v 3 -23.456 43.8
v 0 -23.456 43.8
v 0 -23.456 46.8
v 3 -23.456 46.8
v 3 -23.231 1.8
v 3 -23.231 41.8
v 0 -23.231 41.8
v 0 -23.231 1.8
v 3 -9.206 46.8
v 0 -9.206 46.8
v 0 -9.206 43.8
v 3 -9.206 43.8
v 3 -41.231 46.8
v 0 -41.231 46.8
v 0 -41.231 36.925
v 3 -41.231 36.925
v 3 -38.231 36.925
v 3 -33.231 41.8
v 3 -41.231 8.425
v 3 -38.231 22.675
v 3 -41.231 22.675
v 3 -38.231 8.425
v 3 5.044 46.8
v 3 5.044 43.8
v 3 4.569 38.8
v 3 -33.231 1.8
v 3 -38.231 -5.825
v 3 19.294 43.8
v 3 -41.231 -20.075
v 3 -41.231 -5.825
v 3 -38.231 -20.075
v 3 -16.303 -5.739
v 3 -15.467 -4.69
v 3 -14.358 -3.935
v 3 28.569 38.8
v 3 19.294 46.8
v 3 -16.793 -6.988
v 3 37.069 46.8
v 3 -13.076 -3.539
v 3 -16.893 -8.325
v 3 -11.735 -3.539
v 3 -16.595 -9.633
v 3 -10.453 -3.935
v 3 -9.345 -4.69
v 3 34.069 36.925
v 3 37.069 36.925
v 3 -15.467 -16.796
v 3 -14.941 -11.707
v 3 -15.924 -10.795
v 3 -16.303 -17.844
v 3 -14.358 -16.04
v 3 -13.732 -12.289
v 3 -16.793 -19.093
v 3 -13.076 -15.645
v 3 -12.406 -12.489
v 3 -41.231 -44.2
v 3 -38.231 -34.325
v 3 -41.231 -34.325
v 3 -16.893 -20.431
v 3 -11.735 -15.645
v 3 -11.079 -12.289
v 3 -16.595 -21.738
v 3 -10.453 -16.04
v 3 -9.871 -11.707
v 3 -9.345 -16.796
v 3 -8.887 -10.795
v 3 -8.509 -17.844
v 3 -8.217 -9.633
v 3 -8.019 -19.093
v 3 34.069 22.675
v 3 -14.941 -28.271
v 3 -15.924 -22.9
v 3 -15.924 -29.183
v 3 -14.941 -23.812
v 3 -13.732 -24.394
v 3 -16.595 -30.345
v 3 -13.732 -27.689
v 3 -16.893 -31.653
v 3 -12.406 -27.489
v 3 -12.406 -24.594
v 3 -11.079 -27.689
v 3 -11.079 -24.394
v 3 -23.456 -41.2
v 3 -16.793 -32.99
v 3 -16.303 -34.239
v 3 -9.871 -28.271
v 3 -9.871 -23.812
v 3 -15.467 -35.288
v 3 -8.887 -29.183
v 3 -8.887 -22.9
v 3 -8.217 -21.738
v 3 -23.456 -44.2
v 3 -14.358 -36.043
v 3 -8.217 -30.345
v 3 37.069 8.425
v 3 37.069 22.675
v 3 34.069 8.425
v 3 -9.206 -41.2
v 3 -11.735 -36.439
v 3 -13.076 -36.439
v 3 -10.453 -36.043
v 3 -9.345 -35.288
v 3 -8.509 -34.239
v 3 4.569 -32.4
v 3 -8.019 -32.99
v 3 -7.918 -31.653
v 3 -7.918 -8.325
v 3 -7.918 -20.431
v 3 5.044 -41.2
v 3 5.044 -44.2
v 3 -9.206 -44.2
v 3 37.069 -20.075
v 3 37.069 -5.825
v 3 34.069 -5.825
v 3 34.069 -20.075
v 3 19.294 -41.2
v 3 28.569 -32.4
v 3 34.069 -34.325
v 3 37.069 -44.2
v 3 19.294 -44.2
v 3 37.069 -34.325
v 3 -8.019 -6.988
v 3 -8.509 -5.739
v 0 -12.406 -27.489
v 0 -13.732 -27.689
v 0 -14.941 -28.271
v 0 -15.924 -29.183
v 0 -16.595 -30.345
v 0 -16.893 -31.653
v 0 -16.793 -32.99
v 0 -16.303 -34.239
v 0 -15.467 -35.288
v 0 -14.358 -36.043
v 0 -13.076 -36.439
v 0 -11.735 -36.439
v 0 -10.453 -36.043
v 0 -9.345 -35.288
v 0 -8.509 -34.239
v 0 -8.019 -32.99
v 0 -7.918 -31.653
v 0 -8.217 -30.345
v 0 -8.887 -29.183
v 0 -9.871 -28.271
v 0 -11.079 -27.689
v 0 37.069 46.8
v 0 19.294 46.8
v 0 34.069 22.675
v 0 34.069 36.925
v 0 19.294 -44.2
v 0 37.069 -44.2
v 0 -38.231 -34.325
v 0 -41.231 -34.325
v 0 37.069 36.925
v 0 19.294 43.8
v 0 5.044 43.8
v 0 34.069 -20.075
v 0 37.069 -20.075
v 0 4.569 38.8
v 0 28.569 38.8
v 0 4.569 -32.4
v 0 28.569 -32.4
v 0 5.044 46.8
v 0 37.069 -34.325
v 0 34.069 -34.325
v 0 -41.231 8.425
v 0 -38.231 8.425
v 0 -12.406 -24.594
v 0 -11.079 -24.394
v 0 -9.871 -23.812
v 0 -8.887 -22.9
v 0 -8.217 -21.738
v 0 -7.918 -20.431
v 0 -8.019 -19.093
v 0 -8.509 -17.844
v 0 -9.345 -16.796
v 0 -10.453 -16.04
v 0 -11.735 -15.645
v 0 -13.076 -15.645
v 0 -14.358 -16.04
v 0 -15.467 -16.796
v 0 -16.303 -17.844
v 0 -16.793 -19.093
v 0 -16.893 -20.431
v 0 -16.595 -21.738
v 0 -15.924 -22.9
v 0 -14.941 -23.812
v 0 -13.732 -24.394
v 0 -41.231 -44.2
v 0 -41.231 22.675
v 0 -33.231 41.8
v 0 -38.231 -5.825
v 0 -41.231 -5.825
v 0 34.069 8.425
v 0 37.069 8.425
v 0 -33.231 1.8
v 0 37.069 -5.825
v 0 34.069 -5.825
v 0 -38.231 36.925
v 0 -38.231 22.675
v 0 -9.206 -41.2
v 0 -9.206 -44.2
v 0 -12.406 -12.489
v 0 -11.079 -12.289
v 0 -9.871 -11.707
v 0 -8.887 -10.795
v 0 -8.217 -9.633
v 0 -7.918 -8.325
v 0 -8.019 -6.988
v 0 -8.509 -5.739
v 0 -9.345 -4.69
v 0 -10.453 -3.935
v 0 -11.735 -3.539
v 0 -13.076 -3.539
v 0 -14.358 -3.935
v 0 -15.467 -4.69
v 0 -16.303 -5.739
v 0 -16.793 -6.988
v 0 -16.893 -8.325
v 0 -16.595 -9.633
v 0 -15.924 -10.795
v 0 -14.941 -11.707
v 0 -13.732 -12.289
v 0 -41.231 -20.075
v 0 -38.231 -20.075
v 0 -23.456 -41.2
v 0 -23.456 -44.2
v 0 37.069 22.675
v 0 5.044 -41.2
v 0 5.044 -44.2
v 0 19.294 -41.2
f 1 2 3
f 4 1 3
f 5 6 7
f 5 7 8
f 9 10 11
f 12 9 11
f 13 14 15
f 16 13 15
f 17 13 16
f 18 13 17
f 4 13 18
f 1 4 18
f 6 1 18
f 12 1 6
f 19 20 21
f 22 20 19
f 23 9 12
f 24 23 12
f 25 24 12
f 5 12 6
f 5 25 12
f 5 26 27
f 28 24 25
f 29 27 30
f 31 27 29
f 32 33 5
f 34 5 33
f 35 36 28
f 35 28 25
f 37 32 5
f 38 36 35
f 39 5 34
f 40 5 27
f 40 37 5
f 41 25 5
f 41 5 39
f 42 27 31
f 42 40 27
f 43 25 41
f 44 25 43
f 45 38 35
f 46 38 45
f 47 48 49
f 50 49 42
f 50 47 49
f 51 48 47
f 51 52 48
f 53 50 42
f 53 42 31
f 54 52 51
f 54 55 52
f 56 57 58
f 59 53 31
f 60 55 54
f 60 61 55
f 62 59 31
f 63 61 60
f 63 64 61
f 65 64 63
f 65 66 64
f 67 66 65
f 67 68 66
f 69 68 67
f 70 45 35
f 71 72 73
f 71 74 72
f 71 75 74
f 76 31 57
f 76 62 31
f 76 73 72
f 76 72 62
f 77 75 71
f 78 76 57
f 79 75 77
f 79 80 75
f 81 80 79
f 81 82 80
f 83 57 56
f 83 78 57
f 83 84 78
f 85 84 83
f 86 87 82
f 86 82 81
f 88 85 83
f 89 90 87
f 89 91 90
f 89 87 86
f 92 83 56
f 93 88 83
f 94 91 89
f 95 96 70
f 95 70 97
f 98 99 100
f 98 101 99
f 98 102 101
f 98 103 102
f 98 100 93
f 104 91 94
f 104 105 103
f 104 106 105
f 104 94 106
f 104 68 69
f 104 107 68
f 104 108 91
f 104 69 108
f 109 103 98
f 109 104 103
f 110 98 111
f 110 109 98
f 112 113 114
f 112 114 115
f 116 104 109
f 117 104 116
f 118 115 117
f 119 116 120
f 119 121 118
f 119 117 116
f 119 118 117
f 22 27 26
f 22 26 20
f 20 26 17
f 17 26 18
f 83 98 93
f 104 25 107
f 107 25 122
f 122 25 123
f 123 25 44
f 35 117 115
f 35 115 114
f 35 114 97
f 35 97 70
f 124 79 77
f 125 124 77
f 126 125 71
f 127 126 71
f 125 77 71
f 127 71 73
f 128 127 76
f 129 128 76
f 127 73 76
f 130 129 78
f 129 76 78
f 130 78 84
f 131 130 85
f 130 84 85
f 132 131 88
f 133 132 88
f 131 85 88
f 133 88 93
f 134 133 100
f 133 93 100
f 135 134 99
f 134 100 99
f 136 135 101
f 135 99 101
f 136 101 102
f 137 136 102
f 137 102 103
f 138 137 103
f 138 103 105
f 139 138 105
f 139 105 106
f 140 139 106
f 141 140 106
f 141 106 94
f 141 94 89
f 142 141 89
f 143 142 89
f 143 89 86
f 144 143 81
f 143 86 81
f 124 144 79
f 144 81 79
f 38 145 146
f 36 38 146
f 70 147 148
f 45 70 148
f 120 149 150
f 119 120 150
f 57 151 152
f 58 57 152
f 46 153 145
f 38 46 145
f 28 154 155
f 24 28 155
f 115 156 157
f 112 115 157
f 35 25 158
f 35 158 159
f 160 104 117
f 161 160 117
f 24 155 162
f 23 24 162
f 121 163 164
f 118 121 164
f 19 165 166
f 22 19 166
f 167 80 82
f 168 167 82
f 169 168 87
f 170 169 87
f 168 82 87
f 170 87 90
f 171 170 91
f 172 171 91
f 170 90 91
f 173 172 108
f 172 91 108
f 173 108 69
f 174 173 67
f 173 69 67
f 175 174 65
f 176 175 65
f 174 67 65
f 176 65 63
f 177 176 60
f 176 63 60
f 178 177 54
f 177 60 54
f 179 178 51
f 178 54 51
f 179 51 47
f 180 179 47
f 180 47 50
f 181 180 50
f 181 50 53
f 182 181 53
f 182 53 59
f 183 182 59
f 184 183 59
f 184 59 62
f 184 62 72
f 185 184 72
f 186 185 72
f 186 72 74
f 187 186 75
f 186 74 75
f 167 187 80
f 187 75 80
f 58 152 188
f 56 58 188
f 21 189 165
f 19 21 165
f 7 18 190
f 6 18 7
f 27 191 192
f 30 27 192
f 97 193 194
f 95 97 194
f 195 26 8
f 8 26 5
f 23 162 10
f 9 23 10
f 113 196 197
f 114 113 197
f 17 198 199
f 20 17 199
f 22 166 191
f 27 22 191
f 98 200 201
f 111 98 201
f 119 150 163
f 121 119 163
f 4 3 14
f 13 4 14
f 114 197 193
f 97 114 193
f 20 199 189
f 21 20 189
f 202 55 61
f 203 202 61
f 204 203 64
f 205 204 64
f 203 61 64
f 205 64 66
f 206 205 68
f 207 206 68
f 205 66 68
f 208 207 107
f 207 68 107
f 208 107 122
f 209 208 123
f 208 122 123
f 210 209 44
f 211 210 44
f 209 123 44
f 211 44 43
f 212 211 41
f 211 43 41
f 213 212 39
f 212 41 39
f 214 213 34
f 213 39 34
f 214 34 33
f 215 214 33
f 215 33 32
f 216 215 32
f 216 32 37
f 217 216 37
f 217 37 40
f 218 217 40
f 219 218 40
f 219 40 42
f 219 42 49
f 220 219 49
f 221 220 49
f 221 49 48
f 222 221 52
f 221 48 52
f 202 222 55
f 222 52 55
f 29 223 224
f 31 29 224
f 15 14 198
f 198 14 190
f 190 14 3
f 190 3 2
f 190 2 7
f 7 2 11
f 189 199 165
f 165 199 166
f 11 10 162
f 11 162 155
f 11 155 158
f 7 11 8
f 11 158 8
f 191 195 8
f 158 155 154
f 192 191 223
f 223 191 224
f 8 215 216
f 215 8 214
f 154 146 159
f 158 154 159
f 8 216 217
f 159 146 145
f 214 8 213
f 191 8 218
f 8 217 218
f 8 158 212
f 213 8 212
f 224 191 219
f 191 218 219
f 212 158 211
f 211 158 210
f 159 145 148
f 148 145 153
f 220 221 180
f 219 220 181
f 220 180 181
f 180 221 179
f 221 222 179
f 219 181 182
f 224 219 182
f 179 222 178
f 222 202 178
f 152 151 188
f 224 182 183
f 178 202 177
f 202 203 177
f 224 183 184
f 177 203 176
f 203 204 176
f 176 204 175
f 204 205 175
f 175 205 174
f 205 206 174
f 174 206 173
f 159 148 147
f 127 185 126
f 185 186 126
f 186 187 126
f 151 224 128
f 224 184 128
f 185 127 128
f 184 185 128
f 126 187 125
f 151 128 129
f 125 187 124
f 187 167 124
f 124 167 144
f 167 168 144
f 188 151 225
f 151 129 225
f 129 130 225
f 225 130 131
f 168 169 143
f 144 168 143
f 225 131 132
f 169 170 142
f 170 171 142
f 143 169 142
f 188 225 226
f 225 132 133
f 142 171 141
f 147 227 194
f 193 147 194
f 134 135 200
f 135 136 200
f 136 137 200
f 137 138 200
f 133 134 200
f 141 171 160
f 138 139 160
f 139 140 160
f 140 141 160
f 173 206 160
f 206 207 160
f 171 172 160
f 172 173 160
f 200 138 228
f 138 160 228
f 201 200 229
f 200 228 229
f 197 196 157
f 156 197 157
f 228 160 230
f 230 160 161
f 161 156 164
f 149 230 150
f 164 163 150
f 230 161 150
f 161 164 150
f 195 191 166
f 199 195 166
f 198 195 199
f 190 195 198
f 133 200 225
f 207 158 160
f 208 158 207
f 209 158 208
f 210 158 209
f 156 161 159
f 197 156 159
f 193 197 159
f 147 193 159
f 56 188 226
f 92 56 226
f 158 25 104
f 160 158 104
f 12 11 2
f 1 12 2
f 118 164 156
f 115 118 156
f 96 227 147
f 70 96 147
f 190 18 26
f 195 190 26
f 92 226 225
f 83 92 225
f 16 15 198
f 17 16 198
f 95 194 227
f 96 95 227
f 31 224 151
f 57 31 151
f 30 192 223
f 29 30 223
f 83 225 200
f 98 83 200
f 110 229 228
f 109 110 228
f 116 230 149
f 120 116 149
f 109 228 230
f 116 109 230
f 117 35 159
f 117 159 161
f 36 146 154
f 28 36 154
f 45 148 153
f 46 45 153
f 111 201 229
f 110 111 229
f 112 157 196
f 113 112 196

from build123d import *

# Parameters (mm, degrees)
BOSS_EXTRUDE1_DEPTH = 3
SKETCH2_R           = 4.5
SKETCH2_W           = 71.2
SKETCH2_H           = 24
SKETCH2_W_2         = 40
SKETCH2_H_2         = 10
CUT_EXTRUDE1_DEPTH  = 3


with BuildPart() as part:
    # Sketch1 → Boss-Extrude1 (new body)
    with BuildSketch(Plane(origin=(0, 0, 0), x_dir=(0, 0, -1), z_dir=(1, 0, 0))):
        Polygon((-46.800460417, 37.069263333), (-46.800460417, 19.294263333), (-43.800460417, 19.294263333), (-43.800460417, 5.044263333), (-46.800460417, 5.044263333), (-46.800460417, -9.205736667), (-43.800460417, -9.205736667), (-43.800460417, -23.455736667), (-46.800460417, -23.455736667), (-46.800460417, -37.705736667), (-46.800460417, -41.230736667), (-36.925460417, -41.230736667), (-36.925460417, -38.230736667), (-22.675460417, -38.230736667), (-22.675460417, -41.230736667), (-8.425460417, -41.230736667), (-8.425460417, -38.230736667), (5.824539583, -38.230736667), (5.824539583, -41.230736667), (20.074539583, -41.230736667), (20.074539583, -38.230736667), (34.324539583, -38.230736667), (34.324539583, -41.230736667), (44.199539583, -41.230736667), (44.199539583, -23.455736667), (41.199539583, -23.455736667), (41.199539583, -9.205736667), (44.199539583, -9.205736667), (44.199539583, 5.044263333), (41.199539583, 5.044263333), (41.199539583, 19.294263333), (44.199539583, 19.294263333), (44.199539583, 33.544263333), (44.199539583, 37.069263333), (34.324539583, 37.069263333), (34.324539583, 34.069263333), (20.074539583, 34.069263333), (20.074539583, 37.069263333), (5.824539583, 37.069263333), (5.824539583, 34.069263333), (-8.425460417, 34.069263333), (-8.425460417, 37.069263333), (-22.675460417, 37.069263333), (-22.675460417, 34.069263333), (-36.925460417, 34.069263333), (-36.925460417, 37.069263333), align=None)
    extrude(amount=BOSS_EXTRUDE1_DEPTH)

    # Sketch2 → Cut-Extrude1 (cut)
    with BuildSketch(Plane(origin=(3, 0, 0), x_dir=(0, 0, -1), z_dir=(1, 0, 0))):
        with Locations((20.094295928, -12.405736667)):
            Circle(SKETCH2_R)
        with Locations((7.989052272, -12.405736667)):
            Circle(SKETCH2_R)
        with Locations(Location((31.989052272, -12.405736667, 0), (0, 0, 180))):
            Circle(SKETCH2_R)
        with Locations((-3.200460417, 16.569263333)):
            Rectangle(SKETCH2_W, SKETCH2_H)
        with Locations((-21.800460417, -28.230736667)):
            Rectangle(SKETCH2_W_2, SKETCH2_H_2)
    extrude(amount=-CUT_EXTRUDE1_DEPTH, mode=Mode.SUBTRACT)


solid = part.part
